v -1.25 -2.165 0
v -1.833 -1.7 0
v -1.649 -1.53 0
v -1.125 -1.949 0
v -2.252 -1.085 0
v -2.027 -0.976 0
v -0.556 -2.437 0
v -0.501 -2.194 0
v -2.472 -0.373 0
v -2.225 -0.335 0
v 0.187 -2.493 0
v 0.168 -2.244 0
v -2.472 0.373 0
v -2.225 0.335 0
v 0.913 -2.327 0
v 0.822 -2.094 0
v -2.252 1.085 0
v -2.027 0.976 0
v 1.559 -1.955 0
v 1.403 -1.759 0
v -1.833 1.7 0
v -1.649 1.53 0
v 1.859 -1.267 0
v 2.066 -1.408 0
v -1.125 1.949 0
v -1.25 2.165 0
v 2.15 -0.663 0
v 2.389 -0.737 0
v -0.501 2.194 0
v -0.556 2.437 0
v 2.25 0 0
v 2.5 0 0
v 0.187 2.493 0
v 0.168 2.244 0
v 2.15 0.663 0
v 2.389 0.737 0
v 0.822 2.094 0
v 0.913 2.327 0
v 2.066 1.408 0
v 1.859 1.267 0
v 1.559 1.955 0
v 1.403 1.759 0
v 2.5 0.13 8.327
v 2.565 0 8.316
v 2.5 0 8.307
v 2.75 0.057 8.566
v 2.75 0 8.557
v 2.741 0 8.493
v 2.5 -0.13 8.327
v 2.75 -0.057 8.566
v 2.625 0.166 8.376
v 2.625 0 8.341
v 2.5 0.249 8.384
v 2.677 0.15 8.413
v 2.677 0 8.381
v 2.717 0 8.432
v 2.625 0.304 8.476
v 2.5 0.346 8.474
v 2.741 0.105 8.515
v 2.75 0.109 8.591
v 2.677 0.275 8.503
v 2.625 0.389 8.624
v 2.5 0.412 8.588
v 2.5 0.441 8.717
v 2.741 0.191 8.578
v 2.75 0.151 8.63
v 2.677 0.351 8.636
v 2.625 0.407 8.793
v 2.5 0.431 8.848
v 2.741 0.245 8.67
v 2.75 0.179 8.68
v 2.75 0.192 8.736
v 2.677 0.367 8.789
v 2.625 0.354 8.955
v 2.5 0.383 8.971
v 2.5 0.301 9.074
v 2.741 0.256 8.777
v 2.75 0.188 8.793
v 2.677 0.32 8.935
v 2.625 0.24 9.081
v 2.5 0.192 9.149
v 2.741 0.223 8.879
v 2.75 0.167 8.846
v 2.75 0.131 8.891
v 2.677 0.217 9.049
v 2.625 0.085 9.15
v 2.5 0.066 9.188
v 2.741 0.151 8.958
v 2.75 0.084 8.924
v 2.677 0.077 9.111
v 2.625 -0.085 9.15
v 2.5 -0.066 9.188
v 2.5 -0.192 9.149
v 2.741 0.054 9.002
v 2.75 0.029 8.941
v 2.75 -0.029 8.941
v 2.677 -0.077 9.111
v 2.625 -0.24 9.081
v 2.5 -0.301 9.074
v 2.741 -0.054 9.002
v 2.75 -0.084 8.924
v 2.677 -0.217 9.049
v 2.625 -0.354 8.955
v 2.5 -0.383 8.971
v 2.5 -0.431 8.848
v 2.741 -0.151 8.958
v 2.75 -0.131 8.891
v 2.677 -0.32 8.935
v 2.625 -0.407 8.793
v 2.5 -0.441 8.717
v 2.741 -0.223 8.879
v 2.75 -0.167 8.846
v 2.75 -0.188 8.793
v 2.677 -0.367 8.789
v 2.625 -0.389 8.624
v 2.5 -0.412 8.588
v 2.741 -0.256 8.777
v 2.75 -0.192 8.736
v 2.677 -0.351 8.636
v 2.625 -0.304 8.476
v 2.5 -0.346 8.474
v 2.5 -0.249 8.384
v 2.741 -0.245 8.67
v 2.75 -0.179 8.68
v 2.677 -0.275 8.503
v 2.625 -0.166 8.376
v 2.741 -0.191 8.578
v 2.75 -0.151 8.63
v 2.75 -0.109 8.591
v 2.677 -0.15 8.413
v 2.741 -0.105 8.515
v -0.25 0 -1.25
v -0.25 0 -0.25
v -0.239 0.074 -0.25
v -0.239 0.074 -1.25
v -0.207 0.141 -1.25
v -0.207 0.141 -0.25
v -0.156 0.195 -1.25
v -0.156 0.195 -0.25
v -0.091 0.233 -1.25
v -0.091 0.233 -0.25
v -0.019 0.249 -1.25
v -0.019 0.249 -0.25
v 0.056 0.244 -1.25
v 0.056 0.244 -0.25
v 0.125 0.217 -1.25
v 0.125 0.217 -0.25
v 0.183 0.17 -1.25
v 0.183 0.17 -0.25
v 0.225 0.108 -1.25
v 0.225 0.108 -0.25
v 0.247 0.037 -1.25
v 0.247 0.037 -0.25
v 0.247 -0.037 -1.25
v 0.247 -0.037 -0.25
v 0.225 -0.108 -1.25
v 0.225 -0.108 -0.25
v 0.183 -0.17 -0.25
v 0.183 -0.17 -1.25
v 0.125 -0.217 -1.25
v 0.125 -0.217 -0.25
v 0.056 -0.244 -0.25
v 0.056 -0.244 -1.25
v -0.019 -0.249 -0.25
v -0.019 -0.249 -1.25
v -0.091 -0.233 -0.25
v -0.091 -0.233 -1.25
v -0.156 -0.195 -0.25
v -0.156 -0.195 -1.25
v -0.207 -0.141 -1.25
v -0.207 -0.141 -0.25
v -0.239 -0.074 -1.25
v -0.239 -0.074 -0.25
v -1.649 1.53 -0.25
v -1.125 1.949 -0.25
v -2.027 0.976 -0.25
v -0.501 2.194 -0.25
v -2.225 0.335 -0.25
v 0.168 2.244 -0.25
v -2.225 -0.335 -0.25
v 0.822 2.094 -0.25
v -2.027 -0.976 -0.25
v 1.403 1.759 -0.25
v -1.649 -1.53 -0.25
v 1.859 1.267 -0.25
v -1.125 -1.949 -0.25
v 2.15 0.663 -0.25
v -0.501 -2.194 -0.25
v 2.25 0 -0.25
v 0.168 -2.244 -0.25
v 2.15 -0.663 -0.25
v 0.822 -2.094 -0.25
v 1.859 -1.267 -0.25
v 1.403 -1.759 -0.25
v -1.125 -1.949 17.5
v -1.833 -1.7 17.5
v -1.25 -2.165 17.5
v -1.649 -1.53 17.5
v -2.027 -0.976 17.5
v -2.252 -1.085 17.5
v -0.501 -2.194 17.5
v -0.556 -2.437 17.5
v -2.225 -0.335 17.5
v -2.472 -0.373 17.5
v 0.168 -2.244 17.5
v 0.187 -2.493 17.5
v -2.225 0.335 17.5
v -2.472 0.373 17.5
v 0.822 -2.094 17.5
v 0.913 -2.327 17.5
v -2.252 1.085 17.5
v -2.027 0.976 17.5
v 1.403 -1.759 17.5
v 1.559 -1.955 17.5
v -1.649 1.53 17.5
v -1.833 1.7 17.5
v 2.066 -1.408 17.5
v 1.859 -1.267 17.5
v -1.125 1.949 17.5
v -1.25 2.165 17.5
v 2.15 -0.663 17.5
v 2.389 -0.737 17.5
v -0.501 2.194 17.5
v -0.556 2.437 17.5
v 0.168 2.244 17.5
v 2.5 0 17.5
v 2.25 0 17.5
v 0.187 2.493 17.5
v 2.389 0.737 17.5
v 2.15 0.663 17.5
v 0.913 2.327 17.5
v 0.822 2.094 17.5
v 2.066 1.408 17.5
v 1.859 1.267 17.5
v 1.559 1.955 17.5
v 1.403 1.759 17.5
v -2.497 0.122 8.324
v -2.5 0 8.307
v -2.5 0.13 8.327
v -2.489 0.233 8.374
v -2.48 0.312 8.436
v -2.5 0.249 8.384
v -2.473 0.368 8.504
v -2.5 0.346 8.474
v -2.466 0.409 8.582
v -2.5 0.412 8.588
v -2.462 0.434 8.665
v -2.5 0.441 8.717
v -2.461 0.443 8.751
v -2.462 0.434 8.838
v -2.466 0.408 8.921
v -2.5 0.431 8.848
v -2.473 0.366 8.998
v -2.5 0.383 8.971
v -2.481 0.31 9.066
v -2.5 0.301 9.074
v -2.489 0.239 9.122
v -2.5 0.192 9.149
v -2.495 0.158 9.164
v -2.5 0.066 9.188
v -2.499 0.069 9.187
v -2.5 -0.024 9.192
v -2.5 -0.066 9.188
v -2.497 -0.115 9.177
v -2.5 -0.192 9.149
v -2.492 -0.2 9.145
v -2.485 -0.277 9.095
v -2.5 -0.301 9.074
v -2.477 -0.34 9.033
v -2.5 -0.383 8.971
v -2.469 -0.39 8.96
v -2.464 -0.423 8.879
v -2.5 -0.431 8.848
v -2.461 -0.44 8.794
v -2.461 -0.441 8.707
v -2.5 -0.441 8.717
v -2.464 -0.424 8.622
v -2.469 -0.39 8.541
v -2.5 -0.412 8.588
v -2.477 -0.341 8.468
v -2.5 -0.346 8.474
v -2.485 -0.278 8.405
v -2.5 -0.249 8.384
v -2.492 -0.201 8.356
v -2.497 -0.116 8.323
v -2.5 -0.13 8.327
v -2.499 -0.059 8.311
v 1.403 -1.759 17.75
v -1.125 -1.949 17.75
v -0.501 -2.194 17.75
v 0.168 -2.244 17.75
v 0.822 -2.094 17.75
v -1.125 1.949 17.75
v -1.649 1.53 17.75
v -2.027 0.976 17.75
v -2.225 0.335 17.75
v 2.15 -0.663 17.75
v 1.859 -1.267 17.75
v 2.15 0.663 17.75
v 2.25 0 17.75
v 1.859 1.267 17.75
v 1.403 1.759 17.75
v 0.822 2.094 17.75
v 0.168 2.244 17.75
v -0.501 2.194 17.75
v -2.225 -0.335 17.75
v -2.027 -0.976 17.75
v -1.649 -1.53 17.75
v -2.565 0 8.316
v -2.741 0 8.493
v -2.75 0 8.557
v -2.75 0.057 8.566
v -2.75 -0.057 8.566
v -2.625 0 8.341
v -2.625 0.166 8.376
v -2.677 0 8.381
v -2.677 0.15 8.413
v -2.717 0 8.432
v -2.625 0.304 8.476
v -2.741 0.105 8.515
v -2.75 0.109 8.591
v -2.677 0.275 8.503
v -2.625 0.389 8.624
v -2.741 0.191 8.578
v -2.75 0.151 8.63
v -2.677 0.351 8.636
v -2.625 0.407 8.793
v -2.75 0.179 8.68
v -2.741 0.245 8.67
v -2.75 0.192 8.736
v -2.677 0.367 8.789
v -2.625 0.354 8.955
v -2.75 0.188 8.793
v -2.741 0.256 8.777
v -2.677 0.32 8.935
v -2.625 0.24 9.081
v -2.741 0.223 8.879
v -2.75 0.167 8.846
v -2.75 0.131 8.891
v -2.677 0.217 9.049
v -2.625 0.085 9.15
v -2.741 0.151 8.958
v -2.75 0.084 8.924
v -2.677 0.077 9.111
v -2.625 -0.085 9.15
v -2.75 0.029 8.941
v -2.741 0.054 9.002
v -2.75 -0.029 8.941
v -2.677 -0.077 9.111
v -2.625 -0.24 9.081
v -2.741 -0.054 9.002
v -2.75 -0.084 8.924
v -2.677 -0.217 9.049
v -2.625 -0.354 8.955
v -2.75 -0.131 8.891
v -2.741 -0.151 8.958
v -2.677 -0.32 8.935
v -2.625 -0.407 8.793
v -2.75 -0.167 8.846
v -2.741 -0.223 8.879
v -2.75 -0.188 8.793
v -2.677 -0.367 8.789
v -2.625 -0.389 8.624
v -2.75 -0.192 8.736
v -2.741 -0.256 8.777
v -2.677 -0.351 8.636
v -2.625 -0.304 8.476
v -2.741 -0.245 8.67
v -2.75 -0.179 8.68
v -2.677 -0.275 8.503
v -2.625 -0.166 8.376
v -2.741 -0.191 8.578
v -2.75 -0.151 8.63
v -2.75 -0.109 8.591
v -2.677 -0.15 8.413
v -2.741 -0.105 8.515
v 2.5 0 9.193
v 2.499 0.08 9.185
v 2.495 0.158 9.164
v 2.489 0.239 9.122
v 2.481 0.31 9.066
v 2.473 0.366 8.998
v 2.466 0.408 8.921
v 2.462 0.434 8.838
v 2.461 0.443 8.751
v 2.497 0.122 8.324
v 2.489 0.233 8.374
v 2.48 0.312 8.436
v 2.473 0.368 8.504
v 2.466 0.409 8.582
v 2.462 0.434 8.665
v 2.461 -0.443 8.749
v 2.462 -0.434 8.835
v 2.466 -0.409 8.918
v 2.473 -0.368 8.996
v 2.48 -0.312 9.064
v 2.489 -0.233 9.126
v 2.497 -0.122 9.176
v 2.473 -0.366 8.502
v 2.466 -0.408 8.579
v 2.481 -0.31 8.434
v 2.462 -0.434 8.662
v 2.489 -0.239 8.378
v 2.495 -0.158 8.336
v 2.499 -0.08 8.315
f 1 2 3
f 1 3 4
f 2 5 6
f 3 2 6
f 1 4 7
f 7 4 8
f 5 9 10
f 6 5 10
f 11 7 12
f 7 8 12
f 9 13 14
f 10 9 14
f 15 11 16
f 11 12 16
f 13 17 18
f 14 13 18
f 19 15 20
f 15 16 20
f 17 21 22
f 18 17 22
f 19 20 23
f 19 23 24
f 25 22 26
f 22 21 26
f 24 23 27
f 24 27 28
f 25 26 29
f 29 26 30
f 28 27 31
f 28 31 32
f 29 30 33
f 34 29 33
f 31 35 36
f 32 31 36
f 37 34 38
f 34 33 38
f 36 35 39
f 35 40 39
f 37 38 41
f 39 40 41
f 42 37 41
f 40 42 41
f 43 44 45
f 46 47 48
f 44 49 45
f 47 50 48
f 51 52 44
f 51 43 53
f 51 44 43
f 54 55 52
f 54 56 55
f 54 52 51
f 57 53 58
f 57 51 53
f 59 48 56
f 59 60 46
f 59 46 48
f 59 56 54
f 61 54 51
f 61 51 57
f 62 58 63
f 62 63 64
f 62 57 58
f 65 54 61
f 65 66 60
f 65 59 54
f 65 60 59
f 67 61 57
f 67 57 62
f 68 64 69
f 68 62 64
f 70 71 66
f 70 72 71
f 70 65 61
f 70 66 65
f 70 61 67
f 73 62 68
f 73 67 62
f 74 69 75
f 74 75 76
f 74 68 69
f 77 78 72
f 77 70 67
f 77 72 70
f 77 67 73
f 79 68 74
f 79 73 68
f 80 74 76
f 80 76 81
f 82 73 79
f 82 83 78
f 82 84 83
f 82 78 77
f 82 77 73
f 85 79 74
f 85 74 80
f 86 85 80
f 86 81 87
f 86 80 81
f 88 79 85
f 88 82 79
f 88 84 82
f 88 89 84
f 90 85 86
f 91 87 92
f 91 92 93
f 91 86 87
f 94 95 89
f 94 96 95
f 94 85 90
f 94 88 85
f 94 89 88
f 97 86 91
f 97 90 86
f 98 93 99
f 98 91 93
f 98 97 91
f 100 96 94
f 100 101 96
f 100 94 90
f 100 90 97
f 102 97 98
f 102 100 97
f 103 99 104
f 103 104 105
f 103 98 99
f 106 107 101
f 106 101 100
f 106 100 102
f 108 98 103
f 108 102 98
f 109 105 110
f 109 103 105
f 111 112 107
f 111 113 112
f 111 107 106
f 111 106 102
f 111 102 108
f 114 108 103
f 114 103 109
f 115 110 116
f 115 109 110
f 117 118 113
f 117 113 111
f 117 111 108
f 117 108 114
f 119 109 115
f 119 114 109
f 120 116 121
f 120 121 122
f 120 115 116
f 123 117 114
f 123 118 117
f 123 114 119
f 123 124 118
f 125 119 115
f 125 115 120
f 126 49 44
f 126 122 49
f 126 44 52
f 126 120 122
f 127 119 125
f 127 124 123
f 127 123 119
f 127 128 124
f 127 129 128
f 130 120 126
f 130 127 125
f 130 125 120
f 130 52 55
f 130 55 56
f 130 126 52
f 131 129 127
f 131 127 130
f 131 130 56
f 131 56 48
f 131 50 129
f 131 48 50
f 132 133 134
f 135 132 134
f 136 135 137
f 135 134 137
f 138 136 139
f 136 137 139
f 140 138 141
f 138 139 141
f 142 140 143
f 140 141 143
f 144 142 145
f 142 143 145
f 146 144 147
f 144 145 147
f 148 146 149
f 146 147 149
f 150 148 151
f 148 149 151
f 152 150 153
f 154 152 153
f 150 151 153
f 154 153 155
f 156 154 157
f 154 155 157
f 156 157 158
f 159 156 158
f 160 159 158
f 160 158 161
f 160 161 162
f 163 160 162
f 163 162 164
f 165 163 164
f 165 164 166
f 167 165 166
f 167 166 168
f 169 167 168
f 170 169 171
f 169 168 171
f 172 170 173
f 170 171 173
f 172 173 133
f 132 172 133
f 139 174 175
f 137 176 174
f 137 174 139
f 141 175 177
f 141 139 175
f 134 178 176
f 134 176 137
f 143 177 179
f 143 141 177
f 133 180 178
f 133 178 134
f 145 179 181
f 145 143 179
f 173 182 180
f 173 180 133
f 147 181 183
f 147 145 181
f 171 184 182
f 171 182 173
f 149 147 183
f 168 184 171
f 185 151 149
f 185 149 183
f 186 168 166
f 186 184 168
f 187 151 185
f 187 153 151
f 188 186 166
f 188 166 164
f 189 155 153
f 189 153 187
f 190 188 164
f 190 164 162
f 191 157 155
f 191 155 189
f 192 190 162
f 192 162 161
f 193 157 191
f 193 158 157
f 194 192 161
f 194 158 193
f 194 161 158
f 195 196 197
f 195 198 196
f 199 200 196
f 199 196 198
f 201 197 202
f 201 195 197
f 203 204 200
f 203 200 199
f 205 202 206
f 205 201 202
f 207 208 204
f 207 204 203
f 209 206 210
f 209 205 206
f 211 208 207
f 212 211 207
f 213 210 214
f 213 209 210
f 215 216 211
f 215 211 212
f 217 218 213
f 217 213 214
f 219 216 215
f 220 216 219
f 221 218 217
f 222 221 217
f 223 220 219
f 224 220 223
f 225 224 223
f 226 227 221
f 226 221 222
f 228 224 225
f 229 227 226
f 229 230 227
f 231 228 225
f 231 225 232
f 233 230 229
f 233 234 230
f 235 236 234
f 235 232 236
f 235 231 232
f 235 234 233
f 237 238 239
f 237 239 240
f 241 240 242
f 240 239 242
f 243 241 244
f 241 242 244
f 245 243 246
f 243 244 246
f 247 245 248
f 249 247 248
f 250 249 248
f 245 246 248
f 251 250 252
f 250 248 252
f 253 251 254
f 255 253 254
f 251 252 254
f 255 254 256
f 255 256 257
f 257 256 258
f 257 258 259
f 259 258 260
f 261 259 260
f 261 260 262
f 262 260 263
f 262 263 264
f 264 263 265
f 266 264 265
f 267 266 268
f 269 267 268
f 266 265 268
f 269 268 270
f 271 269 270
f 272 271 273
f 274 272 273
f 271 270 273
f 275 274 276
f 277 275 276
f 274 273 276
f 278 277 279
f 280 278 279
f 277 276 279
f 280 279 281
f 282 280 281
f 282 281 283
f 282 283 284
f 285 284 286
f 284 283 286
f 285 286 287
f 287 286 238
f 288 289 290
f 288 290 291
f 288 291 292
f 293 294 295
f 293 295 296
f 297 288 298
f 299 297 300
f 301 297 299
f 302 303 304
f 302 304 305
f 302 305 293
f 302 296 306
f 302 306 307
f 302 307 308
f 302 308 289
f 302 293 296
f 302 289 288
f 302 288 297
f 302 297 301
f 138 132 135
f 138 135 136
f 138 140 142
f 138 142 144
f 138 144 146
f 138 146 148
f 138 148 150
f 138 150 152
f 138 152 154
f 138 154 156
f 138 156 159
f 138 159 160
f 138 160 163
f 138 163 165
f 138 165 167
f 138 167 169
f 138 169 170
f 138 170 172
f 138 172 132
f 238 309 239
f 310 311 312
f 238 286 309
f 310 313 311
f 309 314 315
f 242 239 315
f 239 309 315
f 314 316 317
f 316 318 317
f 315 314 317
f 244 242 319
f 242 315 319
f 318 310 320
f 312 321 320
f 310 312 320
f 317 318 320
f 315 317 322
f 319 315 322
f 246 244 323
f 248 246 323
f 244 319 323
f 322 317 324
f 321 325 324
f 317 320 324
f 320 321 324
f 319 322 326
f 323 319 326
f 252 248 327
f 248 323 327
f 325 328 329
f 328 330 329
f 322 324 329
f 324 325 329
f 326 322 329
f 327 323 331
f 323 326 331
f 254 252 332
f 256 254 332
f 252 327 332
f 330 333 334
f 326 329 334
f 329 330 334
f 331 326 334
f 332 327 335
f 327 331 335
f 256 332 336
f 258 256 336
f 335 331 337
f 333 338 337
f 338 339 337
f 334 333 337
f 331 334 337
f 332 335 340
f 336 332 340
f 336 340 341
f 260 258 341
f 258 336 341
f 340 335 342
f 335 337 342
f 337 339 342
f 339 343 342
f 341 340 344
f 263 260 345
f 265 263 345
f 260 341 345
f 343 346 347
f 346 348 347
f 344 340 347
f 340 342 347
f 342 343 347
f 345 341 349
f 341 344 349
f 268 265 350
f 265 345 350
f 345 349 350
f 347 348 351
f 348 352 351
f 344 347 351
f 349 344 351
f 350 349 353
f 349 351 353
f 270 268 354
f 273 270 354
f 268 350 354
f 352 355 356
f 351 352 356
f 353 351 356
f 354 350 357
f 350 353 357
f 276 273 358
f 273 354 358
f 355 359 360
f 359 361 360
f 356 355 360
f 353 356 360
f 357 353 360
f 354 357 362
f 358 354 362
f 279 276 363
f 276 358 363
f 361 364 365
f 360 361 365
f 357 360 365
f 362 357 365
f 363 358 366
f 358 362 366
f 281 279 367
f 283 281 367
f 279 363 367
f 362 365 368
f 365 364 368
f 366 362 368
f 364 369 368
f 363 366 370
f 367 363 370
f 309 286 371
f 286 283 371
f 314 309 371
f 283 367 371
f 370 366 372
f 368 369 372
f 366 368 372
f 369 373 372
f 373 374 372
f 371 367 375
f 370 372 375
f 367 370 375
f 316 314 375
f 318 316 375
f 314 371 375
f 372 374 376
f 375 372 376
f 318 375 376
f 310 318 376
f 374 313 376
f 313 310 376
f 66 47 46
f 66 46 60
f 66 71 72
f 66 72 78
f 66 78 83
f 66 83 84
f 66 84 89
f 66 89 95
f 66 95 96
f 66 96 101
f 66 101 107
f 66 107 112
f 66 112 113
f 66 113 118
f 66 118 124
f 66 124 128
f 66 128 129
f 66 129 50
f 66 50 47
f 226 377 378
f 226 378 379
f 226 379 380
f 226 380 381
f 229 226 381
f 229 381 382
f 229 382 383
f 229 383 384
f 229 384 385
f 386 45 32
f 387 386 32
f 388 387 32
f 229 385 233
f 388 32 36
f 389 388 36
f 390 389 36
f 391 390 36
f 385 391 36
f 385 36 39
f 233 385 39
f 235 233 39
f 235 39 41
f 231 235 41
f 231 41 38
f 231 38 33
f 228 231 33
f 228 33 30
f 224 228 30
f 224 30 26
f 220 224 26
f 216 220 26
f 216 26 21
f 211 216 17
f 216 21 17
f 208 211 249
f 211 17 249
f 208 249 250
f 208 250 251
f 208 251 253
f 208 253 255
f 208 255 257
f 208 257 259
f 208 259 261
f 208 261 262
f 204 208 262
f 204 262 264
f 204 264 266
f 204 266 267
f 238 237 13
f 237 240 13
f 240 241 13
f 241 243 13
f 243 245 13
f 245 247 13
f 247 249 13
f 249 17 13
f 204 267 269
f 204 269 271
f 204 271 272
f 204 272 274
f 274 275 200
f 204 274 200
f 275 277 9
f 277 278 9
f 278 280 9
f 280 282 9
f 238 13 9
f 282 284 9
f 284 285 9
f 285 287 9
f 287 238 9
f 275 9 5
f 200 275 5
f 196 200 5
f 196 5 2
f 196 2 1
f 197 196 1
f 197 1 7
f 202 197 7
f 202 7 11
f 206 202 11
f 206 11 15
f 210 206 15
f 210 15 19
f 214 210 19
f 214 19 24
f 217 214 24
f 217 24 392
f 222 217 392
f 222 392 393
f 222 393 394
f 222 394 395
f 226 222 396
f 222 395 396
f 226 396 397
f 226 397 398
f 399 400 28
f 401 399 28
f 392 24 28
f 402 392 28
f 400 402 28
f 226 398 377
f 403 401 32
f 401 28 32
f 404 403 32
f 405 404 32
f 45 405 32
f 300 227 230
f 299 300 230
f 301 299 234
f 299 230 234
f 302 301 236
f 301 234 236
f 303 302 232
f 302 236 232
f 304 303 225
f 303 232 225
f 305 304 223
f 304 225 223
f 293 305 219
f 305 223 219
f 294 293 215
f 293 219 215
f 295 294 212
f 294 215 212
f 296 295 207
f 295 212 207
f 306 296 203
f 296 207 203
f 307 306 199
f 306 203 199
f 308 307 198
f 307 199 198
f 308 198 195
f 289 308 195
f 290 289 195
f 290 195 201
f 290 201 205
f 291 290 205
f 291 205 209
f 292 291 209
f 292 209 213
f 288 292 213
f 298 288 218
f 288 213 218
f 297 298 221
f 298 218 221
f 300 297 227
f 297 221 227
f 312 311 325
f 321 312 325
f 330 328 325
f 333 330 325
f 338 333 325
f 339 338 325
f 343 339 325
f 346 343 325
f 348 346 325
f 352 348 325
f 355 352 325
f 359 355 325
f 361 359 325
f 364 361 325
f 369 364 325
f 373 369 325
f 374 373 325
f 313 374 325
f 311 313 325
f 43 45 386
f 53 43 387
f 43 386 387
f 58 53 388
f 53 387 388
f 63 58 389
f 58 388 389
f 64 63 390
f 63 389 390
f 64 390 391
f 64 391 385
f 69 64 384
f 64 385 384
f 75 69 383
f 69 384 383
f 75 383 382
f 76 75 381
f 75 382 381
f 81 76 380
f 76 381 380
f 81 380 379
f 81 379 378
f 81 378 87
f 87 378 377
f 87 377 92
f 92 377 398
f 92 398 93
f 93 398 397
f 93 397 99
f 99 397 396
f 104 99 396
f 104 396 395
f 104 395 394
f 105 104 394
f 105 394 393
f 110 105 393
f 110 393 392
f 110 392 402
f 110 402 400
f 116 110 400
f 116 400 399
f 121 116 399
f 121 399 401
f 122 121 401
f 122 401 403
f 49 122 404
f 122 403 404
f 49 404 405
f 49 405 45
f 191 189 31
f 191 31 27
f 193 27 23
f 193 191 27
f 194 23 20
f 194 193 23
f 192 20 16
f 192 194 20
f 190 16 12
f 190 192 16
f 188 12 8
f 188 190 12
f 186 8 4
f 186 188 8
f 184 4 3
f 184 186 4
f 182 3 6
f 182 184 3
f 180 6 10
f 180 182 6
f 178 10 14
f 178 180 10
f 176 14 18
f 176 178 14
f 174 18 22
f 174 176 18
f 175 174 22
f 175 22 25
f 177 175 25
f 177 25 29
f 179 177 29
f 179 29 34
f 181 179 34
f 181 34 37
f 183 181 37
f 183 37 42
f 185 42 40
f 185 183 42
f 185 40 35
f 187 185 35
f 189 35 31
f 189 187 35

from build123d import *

# Parameters (mm, degrees)
SKETCH1_R                = 2.5
BOSS_EXTRUDE1_DEPTH      = 17.5
SKETCH2_R                = 2.25
BOSS_EXTRUDE2_DEPTH      = 0.25
BOSS_EXTRUDE3_START      = 0.25
SKETCH3_R                = 2.25
BOSS_EXTRUDE3_DEPTH      = 0.25
SKETCH4_R                = 0.25
BOSS_EXTRUDE4_DEPTH      = 1
BOSS_EXTRUDE5_DEPTH      = 2.75
BOSS_EXTRUDE5_DEPTH_BACK = 2.75
SKETCH5_R                = 0.442588638
FILLET1_R                = 0.25


with BuildPart() as part:
    # Sketch1 → Boss-Extrude1 (new body)
    with BuildSketch(Plane.XY):
        Circle(SKETCH1_R)
    extrude(amount=BOSS_EXTRUDE1_DEPTH)

    # Sketch2 → Boss-Extrude2 (add)
    with BuildSketch(Plane.XY.offset(17.5)):
        Circle(SKETCH2_R)
    extrude(amount=BOSS_EXTRUDE2_DEPTH)

    # Sketch3 → Boss-Extrude3 (add)
    with BuildSketch(Plane(origin=(0, 0, 0), x_dir=(-1, 0, 0), z_dir=(0, 0, -1)).offset(BOSS_EXTRUDE3_START)):
        with Locations(Location((0, 0, 0), (0, 0, 180))):
            Circle(SKETCH3_R)
    extrude(amount=-BOSS_EXTRUDE3_DEPTH)

    # Sketch4 → Boss-Extrude4 (add)
    with BuildSketch(Plane(origin=(0, 0, -0.25), x_dir=(-1, 0, 0), z_dir=(0, 0, -1))):
        Circle(SKETCH4_R)
    extrude(amount=BOSS_EXTRUDE4_DEPTH)

    # Sketch5 → Boss-Extrude5 (add, two sides: drawn at the far end of the back side and taken through both)
    with BuildSketch(Plane(origin=(0, 0, 0), x_dir=(0, 0, -1), z_dir=(1, 0, 0)).offset(-BOSS_EXTRUDE5_DEPTH_BACK)):
        with Locations((-8.75, 0)):
            Circle(SKETCH5_R)
    extrude(amount=BOSS_EXTRUDE5_DEPTH + BOSS_EXTRUDE5_DEPTH_BACK)

    # Fillet1
    fillet1_edges = [part.edges().sort_by_distance(p)[0] for p in [
        (-2.75, 0, 9.192588638),
        (2.75, 0, 9.192588638),
    ]]
    fillet(fillet1_edges, radius=FILLET1_R - 0.0001)  # a hair under: the kernel refuses the full size


solid = part.part
